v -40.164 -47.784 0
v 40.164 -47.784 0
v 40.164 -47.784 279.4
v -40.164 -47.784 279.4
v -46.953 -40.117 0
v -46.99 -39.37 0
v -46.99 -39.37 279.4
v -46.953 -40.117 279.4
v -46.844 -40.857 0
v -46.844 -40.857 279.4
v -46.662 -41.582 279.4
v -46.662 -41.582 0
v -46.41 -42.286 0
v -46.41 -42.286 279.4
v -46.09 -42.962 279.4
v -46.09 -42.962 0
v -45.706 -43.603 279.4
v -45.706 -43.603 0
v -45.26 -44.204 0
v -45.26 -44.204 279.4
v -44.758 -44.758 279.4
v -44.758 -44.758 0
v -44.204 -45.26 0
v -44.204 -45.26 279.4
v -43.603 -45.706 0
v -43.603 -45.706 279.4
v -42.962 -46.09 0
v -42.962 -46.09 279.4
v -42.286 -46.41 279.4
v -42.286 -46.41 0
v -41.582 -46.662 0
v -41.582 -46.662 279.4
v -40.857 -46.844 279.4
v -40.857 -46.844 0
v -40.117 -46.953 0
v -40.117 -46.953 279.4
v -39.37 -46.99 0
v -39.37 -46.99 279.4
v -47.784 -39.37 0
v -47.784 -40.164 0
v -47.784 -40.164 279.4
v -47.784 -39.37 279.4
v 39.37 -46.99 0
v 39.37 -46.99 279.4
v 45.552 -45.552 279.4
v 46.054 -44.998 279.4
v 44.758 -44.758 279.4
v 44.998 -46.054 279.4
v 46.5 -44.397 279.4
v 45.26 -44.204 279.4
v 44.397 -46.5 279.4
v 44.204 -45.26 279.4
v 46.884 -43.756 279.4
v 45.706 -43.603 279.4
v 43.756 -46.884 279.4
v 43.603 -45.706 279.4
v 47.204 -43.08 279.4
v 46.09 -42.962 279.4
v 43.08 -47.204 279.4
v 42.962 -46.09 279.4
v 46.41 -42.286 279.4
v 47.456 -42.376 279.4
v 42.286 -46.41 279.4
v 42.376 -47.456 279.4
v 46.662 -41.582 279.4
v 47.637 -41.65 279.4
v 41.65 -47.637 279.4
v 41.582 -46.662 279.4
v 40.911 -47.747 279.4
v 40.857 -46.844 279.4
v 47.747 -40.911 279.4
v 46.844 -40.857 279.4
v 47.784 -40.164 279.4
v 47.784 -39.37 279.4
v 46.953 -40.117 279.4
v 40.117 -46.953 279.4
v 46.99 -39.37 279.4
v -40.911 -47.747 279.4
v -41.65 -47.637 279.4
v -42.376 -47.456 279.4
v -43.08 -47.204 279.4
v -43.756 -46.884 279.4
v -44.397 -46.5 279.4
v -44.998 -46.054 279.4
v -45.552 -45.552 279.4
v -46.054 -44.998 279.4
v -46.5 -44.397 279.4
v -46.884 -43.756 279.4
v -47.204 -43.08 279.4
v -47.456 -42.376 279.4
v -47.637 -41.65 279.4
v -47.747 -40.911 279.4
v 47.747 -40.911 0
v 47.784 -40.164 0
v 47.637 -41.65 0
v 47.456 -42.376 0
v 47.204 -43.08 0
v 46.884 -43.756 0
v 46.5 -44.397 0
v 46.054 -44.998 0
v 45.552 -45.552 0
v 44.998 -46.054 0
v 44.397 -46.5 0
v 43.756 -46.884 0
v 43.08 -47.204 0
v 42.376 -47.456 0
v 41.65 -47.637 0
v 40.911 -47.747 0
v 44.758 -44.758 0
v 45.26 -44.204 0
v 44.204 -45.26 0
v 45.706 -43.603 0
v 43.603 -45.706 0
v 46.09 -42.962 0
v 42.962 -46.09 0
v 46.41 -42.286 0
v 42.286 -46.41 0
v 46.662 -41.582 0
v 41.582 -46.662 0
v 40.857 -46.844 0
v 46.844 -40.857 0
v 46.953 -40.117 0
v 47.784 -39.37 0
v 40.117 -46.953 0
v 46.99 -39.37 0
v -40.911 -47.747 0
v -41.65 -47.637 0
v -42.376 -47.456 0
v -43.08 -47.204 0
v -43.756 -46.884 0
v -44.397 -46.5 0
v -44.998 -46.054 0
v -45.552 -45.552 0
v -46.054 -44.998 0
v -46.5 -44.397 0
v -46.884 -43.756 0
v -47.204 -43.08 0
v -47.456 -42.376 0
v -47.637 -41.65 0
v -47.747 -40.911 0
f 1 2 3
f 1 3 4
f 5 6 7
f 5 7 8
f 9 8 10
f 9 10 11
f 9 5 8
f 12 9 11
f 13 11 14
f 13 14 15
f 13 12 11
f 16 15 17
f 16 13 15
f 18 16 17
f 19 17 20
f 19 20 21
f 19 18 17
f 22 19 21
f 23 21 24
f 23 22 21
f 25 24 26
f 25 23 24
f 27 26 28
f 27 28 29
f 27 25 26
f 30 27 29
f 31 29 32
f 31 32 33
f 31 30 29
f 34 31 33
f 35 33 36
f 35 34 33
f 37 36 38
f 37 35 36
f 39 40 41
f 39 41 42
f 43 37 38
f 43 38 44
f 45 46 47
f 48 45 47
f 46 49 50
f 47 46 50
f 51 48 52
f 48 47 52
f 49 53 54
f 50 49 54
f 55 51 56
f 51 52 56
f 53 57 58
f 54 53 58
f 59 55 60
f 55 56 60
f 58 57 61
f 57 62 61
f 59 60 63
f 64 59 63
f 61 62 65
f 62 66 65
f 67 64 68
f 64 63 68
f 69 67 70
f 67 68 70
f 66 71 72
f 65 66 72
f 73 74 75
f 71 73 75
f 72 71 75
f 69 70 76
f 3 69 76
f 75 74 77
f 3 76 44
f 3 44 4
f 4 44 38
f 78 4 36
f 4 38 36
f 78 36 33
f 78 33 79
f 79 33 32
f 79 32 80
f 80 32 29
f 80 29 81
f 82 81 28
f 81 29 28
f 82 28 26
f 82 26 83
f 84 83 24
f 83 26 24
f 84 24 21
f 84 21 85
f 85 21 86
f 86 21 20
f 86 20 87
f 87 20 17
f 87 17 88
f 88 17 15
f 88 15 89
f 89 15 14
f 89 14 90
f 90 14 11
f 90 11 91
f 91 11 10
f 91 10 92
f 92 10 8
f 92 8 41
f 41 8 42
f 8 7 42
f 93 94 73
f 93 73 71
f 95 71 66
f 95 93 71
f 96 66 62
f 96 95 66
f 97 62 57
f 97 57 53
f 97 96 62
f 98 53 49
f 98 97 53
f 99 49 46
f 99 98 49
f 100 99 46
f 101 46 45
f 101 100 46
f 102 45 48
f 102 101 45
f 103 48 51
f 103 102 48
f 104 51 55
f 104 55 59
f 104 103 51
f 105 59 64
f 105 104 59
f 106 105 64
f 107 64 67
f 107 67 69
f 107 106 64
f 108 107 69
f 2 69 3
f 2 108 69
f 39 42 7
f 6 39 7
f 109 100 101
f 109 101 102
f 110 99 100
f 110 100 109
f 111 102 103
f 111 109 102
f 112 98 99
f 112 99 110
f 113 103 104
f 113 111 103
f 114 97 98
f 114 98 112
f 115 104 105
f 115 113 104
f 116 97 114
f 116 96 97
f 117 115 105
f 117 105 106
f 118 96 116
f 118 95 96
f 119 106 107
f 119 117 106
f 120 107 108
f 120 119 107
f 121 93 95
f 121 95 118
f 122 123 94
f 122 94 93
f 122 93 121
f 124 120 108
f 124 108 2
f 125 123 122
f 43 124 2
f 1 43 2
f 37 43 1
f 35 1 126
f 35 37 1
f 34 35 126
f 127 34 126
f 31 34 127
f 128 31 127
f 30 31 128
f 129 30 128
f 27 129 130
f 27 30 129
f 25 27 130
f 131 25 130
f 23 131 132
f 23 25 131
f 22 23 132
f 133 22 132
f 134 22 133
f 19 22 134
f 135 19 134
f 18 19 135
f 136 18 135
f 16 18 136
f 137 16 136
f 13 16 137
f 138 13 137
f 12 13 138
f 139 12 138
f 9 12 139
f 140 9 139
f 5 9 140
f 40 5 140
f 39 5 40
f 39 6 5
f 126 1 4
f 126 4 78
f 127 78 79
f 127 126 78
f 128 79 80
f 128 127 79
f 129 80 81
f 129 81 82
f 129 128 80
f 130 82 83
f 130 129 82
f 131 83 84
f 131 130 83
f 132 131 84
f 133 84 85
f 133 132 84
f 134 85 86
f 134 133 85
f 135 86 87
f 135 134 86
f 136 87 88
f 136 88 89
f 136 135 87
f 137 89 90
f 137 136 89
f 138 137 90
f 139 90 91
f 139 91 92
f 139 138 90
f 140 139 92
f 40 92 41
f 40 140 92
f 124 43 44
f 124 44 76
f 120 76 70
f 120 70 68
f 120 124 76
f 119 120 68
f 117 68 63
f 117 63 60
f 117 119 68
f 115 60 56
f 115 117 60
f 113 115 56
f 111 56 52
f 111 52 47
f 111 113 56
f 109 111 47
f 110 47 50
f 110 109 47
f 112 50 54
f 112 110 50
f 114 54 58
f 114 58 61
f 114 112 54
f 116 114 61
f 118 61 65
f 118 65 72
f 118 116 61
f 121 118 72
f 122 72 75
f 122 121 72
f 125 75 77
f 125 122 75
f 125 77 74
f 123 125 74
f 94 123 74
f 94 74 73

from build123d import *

# Parameters (mm, degrees)
BOSS_EXTRUDE1_DEPTH = 279.4


with BuildPart() as part:
    # Sketch1 → Boss-Extrude1 (new body)
    with BuildSketch(Plane.XY):
        with BuildLine():
            Line((46.99, -39.37), (47.78375, -39.37))
            Line((47.78375, -39.37), (47.78375, -40.16375))
            ThreePointArc((47.78375, -40.16375), (45.551903673, -45.551903673), (40.16375, -47.78375))
            Line((40.16375, -47.78375), (-40.16375, -47.78375))
            ThreePointArc((-40.16375, -47.78375), (-45.551903673, -45.551903673), (-47.78375, -40.16375))
            Line((-47.78375, -40.16375), (-47.78375, -39.37))
            Line((-47.78375, -39.37), (-46.99, -39.37))
            ThreePointArc((-46.99, -39.37), (-44.758153673, -44.758153673), (-39.37, -46.99))
            Line((-39.37, -46.99), (39.37, -46.99))
            ThreePointArc((39.37, -46.99), (44.758153673, -44.758153673), (46.99, -39.37))
        make_face()
    extrude(amount=BOSS_EXTRUDE1_DEPTH)


solid = part.part
